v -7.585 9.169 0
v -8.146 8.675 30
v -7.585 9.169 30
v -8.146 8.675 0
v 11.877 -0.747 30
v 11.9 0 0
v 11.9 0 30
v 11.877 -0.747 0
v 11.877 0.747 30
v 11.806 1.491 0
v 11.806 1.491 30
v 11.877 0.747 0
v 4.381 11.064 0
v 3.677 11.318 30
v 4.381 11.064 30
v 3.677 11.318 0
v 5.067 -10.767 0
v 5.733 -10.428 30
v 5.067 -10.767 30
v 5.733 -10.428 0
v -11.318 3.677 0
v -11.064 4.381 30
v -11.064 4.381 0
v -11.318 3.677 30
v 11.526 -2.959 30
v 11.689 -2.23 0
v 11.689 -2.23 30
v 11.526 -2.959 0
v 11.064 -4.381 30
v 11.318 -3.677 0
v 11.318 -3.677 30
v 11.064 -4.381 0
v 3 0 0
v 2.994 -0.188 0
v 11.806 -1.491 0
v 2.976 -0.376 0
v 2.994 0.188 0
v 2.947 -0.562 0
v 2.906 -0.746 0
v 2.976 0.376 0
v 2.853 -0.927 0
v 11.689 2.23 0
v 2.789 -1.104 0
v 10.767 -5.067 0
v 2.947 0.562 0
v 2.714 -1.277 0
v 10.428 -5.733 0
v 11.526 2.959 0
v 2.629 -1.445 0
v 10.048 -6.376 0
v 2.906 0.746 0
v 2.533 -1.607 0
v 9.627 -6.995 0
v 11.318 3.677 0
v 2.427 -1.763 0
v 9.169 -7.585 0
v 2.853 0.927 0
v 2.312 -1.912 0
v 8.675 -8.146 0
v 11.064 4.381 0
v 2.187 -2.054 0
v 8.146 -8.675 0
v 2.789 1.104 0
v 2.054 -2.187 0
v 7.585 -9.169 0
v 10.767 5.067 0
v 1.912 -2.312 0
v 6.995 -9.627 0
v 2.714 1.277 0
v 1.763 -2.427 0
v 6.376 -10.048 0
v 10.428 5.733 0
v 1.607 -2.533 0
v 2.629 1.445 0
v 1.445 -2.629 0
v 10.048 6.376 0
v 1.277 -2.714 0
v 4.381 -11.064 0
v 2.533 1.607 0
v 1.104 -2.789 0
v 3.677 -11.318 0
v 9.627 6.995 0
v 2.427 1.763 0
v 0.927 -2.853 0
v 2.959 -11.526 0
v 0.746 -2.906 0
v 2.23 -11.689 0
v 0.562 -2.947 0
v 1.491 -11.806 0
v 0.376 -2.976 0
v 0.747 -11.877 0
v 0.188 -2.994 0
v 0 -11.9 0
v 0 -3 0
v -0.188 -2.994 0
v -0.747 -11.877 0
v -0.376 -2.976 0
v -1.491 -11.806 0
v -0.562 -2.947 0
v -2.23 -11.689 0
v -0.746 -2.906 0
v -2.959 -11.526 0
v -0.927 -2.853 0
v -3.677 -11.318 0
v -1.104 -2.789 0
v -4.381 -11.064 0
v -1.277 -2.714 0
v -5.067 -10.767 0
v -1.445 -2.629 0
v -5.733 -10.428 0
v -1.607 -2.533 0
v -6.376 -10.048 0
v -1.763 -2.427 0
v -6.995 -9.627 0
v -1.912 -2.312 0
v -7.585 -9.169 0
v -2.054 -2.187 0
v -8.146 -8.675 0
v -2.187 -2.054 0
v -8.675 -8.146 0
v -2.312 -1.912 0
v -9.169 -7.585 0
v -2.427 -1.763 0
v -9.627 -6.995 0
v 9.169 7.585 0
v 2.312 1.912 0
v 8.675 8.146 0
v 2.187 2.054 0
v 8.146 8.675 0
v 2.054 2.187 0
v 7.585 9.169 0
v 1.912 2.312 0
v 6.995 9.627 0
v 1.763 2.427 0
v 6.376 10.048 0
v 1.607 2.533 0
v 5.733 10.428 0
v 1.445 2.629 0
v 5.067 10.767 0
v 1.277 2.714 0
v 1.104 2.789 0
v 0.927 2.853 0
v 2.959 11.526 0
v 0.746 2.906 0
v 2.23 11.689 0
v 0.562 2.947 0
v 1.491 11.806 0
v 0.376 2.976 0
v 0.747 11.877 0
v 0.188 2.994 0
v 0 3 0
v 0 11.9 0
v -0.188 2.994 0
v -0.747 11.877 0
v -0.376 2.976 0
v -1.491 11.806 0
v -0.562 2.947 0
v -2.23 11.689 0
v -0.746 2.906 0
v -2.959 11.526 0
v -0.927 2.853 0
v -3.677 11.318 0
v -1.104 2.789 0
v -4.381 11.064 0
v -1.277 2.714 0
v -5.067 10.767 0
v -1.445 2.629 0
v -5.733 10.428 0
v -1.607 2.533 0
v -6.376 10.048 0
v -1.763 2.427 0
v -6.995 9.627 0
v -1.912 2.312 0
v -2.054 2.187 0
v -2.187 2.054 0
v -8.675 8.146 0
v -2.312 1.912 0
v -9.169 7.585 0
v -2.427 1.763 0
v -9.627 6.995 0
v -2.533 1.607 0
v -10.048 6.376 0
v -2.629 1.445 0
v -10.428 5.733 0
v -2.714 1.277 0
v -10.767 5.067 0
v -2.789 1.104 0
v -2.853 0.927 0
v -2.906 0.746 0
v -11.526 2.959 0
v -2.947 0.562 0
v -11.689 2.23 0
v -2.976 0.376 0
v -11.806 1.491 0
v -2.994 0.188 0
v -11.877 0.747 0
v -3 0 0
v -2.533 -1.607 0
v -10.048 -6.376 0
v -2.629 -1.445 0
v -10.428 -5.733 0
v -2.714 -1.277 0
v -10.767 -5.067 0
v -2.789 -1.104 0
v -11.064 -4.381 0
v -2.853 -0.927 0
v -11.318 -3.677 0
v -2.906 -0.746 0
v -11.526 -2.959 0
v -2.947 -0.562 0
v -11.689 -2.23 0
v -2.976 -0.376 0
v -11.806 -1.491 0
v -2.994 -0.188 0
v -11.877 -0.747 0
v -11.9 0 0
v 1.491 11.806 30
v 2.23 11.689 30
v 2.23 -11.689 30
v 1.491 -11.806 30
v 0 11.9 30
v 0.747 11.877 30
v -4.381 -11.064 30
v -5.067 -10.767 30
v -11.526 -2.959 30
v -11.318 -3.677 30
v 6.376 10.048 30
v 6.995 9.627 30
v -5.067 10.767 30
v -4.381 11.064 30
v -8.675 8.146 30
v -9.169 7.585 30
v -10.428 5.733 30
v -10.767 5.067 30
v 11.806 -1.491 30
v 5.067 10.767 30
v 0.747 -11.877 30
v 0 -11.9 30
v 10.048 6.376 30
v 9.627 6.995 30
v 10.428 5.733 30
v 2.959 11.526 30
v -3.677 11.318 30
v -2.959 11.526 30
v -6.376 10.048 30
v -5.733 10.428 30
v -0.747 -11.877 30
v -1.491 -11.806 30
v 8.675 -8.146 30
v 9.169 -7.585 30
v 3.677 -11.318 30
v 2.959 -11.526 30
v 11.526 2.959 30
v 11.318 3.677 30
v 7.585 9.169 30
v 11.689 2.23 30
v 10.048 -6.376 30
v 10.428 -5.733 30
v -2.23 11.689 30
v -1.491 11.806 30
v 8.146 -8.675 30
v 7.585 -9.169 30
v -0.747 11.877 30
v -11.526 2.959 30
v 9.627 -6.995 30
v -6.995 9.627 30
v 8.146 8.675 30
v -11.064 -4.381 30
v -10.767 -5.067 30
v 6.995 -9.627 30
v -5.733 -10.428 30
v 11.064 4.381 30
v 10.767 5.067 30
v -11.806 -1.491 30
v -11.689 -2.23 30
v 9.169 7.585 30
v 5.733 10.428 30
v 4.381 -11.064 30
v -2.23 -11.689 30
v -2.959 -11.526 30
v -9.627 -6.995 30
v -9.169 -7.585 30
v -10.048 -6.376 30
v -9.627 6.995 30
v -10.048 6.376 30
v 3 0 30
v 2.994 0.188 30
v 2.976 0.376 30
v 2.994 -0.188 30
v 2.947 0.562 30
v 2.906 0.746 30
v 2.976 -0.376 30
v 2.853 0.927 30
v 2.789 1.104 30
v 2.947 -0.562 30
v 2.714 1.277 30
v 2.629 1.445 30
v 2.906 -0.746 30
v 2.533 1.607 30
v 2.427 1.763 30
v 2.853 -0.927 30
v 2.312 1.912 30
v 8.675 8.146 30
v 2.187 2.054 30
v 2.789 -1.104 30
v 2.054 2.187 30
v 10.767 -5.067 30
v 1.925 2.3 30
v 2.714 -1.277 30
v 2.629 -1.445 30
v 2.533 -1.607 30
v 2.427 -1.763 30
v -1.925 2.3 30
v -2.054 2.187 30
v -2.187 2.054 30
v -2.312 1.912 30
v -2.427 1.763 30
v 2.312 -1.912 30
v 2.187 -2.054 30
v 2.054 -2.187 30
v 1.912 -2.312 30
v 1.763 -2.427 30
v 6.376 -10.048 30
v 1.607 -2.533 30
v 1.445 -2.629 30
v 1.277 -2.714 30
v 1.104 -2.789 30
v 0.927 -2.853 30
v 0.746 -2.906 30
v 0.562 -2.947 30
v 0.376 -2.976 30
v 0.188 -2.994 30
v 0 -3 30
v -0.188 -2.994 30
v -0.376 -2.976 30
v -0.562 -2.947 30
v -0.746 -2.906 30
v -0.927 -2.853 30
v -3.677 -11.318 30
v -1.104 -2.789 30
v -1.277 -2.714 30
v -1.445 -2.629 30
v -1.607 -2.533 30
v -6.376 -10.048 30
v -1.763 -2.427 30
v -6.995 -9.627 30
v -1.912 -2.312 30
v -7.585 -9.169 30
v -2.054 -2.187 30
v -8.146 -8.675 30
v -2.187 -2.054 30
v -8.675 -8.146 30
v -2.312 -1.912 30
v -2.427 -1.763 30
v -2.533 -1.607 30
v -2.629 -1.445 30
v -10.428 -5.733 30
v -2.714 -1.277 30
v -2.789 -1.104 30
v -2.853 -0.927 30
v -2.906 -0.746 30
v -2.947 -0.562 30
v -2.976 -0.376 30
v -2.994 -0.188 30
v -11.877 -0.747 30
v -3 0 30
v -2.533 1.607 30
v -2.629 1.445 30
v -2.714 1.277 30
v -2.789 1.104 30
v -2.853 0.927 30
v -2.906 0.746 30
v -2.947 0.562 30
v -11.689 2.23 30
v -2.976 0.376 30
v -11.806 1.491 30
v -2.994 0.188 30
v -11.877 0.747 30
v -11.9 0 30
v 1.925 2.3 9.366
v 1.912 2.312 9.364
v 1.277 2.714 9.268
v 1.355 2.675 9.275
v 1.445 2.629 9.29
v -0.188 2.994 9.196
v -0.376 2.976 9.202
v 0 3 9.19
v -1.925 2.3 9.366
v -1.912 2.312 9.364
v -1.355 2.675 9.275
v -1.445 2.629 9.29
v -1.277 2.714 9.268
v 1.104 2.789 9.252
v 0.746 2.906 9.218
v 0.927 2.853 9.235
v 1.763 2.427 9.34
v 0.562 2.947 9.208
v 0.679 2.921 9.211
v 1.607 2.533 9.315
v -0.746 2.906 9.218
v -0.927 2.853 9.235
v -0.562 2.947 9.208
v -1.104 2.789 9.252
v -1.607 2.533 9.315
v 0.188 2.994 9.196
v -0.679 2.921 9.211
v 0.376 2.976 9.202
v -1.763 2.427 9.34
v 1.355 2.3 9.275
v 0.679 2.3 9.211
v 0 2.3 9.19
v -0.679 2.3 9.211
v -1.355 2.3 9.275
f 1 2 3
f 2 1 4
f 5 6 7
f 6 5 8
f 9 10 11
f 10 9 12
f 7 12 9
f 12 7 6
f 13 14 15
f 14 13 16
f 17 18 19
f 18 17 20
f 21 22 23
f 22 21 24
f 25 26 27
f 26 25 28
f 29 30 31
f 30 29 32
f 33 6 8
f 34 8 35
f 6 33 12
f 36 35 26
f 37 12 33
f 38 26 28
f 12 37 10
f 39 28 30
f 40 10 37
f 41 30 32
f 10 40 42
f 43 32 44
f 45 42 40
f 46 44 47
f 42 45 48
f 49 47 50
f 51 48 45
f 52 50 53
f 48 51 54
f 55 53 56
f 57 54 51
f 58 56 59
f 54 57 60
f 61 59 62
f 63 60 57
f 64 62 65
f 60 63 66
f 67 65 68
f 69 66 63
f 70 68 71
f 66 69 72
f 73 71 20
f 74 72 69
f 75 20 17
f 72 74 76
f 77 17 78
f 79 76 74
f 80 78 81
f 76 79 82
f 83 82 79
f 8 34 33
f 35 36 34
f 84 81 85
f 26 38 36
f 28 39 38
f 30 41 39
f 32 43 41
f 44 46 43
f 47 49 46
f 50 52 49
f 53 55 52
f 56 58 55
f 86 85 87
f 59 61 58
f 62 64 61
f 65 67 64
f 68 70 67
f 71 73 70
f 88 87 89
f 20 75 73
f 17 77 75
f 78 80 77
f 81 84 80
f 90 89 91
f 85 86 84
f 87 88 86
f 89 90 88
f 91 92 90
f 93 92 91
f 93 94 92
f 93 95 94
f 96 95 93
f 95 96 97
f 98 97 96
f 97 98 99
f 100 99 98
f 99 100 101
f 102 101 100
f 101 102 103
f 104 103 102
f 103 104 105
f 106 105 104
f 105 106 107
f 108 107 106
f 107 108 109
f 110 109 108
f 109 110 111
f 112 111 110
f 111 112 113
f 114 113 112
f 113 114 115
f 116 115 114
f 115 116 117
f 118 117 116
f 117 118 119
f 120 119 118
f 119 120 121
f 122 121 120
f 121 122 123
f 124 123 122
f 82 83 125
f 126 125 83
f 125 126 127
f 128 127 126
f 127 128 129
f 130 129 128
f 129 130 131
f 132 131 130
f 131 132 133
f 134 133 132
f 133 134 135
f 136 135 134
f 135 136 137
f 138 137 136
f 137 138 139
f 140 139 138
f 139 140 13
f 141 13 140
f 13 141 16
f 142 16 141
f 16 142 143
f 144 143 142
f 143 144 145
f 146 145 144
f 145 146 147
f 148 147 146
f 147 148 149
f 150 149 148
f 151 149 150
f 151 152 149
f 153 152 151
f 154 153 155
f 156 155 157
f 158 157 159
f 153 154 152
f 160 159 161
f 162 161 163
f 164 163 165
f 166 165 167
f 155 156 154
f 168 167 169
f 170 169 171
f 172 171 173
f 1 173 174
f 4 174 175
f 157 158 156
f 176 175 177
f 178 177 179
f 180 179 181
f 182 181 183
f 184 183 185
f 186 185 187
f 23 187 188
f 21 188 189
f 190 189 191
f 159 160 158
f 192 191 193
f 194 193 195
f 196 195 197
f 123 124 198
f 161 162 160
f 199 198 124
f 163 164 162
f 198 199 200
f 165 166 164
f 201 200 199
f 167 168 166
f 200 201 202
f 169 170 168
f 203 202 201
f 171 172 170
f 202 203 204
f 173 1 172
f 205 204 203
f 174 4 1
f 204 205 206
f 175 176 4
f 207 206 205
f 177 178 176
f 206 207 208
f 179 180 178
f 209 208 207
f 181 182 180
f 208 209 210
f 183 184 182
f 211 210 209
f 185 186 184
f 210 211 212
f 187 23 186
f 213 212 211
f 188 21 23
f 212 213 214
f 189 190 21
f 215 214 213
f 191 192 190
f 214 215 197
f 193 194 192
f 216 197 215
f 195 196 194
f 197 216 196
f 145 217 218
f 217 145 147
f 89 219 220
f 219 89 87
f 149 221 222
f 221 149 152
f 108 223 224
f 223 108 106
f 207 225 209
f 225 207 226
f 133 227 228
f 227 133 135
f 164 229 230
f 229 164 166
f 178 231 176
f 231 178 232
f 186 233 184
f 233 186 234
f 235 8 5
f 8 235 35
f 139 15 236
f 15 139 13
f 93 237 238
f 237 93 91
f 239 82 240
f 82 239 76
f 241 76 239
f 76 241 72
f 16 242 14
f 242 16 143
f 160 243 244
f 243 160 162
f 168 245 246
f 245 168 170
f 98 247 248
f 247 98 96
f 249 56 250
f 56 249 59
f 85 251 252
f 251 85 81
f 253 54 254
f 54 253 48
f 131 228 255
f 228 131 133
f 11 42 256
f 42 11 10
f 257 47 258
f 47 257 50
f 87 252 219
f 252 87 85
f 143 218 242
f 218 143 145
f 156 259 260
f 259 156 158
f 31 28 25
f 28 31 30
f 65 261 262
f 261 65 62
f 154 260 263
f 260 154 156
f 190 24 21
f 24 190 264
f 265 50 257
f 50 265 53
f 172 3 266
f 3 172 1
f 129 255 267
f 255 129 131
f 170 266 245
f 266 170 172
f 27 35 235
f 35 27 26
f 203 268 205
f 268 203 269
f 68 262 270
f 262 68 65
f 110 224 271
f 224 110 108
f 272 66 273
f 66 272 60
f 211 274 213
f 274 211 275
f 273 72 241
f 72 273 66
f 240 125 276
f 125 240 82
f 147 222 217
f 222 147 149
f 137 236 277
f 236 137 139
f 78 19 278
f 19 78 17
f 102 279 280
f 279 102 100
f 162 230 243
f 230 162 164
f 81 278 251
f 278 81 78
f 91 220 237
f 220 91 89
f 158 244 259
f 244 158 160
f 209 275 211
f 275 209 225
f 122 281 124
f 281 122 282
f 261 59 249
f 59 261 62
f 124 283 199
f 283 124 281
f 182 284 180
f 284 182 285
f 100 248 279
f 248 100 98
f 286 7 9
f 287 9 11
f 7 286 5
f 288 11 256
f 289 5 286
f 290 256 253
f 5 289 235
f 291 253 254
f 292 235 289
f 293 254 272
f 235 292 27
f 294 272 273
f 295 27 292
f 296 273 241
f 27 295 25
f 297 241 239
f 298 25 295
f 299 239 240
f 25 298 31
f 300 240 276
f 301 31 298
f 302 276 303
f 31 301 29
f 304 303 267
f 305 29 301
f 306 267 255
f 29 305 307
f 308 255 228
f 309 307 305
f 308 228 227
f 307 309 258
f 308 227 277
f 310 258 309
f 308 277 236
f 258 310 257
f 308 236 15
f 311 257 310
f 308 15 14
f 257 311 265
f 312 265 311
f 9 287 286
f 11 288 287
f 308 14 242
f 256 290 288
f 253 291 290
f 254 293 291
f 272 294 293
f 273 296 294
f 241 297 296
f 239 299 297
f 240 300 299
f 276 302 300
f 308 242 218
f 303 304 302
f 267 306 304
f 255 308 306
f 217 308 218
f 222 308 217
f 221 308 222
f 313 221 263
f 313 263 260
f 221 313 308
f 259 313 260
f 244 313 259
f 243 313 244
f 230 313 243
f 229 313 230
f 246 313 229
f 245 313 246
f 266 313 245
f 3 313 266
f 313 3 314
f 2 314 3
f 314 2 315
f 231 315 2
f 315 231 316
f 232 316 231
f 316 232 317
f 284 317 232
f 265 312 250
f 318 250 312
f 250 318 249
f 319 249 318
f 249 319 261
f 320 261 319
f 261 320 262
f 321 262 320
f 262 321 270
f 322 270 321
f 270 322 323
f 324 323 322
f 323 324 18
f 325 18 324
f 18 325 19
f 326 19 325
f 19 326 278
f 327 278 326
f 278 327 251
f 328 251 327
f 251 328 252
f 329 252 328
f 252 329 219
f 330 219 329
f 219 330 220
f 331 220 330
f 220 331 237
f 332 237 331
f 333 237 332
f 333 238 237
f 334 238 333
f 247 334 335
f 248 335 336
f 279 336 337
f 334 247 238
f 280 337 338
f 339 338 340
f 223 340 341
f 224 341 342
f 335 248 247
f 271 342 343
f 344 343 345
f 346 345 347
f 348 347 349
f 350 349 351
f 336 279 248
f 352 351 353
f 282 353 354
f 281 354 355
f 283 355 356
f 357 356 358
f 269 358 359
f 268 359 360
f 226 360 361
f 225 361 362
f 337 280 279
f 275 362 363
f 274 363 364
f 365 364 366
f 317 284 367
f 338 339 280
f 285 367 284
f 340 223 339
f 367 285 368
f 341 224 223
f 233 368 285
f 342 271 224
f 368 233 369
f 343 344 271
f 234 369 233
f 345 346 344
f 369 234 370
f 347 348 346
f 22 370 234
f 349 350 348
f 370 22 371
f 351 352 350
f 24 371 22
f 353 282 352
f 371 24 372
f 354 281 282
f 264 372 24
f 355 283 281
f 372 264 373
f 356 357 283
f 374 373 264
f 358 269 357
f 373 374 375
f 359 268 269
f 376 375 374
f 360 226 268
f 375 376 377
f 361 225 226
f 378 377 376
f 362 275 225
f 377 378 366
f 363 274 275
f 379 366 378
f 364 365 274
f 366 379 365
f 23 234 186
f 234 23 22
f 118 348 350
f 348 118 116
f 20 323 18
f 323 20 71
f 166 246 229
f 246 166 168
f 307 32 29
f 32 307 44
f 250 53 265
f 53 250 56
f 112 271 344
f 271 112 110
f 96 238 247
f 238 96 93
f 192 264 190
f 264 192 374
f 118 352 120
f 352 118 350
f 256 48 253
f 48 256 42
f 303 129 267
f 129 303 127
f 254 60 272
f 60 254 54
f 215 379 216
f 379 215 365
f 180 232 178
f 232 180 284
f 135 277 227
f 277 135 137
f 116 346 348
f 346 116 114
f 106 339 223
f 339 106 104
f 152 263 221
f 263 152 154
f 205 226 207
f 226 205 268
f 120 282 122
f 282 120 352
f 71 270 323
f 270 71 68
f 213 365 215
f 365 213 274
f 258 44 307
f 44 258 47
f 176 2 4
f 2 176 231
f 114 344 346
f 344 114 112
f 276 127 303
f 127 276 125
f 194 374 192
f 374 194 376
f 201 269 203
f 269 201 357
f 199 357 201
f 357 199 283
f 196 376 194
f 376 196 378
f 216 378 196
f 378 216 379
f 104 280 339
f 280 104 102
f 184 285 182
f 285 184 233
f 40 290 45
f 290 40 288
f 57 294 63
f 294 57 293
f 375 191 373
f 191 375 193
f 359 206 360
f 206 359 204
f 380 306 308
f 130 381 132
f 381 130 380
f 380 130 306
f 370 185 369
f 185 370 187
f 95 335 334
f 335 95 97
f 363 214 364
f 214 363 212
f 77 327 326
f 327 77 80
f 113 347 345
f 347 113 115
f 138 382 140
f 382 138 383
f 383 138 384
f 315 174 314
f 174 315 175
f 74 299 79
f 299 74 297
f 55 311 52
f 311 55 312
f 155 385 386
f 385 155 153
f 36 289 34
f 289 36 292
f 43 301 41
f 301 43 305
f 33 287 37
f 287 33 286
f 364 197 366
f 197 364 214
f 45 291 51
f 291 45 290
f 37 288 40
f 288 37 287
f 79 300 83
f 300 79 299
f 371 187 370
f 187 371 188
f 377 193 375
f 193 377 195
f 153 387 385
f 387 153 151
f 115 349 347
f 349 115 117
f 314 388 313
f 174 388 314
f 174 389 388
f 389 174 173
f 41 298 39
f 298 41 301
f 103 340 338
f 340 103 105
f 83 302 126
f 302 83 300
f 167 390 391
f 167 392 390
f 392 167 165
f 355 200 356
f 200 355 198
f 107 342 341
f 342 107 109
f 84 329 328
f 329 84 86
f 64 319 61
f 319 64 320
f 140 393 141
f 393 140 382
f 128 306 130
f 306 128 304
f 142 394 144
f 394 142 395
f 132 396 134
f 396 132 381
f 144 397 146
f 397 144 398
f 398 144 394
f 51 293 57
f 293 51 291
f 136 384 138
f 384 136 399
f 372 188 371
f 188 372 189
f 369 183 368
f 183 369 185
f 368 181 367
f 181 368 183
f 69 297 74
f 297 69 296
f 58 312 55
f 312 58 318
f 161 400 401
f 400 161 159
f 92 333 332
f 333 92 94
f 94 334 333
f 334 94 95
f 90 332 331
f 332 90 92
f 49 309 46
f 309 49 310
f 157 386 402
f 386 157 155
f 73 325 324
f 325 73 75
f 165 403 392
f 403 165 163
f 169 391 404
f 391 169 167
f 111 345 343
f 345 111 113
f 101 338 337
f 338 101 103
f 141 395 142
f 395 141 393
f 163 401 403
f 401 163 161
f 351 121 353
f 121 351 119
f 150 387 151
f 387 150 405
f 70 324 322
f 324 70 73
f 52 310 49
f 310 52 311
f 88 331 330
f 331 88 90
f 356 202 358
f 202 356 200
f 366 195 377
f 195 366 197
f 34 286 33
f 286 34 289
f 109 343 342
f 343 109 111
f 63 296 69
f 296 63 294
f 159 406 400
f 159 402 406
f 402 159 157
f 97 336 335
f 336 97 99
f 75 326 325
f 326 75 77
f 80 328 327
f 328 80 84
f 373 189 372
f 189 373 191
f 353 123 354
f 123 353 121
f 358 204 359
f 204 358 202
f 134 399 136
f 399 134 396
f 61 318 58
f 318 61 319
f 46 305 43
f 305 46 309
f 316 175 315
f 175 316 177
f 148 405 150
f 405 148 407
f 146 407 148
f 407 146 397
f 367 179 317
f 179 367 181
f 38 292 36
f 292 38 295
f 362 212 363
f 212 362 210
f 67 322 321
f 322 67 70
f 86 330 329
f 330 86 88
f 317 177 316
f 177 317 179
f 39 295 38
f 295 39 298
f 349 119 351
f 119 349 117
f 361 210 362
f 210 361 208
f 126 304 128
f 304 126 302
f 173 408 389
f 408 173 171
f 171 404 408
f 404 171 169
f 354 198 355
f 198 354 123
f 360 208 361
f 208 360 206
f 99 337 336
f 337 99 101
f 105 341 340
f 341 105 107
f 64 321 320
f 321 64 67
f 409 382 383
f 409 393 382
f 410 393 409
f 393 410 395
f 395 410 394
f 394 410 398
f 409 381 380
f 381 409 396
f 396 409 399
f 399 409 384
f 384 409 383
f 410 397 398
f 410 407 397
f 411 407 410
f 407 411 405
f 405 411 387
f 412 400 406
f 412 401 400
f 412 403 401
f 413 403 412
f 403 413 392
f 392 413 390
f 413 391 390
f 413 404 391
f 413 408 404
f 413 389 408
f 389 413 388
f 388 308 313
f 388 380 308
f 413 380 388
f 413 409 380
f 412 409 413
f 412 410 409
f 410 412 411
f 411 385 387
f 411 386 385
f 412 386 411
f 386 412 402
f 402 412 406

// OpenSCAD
$fn = 100;

union()
{
    difference()
    {
        cylinder(r = 23.8/2, h = 30);
        cylinder(r = 6/2, h = 30);
    }

    intersection()
    {
        cylinder(r = 23.8/2, h = 30);
        translate([0,4.1,20])
            {
                rotate([90,0,0])
                    {
                        cylinder(r=10.81, h = 1.8);
                    }   
            }
    }   
}
